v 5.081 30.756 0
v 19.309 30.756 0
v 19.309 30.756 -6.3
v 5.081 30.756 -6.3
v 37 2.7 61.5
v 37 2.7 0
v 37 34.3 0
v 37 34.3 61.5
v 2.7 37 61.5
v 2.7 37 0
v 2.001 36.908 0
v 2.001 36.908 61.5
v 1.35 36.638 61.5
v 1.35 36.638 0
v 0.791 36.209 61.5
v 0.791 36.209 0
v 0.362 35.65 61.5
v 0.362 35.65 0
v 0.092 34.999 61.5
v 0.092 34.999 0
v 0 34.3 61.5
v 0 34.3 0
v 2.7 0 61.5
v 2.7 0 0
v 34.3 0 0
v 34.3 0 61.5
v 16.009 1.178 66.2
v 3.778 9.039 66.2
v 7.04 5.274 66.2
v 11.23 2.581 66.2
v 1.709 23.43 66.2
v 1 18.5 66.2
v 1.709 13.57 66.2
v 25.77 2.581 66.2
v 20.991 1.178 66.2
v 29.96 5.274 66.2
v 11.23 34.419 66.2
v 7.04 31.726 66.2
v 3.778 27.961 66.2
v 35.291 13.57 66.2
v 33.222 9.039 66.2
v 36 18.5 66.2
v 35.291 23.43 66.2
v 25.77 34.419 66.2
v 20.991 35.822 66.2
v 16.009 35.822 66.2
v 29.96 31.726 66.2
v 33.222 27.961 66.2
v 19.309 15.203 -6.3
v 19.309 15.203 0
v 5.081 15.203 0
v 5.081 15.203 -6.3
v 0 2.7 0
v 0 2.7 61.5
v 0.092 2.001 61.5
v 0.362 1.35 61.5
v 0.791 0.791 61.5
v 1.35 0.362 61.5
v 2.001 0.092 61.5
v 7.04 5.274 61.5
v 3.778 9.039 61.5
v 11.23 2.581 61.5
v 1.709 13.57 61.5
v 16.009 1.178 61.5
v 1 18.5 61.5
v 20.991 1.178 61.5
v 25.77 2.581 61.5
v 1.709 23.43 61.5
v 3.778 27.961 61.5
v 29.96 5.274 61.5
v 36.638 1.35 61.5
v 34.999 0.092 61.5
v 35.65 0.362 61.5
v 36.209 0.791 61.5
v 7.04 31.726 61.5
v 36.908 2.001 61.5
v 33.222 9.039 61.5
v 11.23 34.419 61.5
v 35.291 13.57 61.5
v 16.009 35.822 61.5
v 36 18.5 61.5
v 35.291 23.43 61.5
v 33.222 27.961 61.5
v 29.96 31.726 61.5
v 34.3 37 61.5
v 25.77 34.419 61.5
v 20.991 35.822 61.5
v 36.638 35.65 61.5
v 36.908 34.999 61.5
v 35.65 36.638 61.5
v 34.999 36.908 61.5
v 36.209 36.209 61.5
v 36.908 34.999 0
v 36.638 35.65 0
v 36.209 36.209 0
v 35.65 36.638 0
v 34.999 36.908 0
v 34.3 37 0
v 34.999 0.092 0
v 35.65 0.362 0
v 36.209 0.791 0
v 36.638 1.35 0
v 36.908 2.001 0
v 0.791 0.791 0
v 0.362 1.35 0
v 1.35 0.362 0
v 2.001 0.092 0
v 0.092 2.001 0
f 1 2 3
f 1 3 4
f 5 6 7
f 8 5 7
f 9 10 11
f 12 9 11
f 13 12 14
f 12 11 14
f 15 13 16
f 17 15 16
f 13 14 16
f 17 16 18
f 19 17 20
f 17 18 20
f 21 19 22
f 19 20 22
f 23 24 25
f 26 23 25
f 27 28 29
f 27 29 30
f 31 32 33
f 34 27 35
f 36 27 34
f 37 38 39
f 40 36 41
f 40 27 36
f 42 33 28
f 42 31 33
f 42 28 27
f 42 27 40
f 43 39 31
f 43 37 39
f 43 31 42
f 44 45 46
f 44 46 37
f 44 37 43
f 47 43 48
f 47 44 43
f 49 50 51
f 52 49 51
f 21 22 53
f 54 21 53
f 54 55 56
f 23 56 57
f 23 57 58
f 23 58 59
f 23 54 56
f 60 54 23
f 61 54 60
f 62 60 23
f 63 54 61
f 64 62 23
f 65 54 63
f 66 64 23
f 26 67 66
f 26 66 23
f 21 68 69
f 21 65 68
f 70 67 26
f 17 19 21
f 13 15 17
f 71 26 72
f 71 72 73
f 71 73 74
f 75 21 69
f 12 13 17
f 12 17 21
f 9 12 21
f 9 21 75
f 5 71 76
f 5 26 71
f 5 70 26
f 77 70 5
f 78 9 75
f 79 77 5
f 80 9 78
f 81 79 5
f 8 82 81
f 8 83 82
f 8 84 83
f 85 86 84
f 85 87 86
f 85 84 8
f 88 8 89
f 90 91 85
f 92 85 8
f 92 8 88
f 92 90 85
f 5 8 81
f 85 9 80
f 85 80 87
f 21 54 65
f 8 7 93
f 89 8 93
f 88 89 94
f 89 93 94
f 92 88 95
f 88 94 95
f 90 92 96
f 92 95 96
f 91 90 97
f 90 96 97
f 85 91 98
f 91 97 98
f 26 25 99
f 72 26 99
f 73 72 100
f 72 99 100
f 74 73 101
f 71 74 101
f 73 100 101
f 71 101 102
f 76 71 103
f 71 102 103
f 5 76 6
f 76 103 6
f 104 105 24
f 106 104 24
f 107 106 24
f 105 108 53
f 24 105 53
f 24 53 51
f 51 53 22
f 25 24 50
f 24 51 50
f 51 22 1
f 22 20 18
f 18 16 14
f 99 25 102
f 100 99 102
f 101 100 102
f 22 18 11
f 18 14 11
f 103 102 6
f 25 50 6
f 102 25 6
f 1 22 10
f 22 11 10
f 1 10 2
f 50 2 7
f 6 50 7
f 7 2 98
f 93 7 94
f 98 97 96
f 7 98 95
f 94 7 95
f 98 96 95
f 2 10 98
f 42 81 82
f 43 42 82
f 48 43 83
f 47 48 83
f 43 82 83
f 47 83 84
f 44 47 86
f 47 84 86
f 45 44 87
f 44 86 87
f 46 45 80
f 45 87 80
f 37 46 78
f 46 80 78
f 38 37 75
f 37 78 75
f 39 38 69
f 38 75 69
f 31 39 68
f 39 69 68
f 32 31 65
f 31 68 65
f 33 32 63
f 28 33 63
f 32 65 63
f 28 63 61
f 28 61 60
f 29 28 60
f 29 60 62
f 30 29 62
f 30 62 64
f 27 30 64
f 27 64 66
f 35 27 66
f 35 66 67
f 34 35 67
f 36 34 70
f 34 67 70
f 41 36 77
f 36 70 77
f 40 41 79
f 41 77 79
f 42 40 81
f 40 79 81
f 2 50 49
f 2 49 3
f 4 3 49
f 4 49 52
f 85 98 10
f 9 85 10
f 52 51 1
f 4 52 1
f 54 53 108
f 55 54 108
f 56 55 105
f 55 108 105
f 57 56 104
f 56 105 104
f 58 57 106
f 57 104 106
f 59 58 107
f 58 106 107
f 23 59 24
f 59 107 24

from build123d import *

# Parameters (mm, degrees)
BOSS_EXTRUDE1_DEPTH = 61.5
SKETCH3_R           = 17.5
BOSS_EXTRUDE2_DEPTH = 4.7
SKETCH4_W           = 14.228114438
SKETCH4_H           = 15.553065114
BOSS_EXTRUDE3_DEPTH = 6.3


with BuildPart() as part:
    # Sketch1 → Boss-Extrude1 (new body)
    with BuildSketch(Plane.XY):
        with BuildLine():
            Line((2.7, 0), (34.3, 0))
            ThreePointArc((34.3, 0), (36.209188309, 0.790811691), (37, 2.7))
            Line((37, 2.7), (37, 34.3))
            ThreePointArc((37, 34.3), (36.209188309, 36.209188309), (34.3, 37))
            Line((34.3, 37), (2.7, 37))
            ThreePointArc((2.7, 37), (0.790811691, 36.209188309), (0, 34.3))
            Line((0, 34.3), (0, 2.7))
            ThreePointArc((0, 2.7), (0.790811691, 0.790811691), (2.7, 0))
        make_face()
    extrude(amount=BOSS_EXTRUDE1_DEPTH)

    # Sketch3 → Boss-Extrude2 (add)
    with BuildSketch(Plane.XY.offset(61.5)):
        with Locations((18.5, 18.5)):
            Circle(SKETCH3_R)
    extrude(amount=BOSS_EXTRUDE2_DEPTH)

    # Sketch4 → Boss-Extrude3 (add)
    with BuildSketch(Plane(origin=(0, 0, 0), x_dir=(-1, 0, 0), z_dir=(0, 0, -1))):
        with Locations((-12.194929465, 22.979733571)):
            Rectangle(SKETCH4_W, SKETCH4_H)
    extrude(amount=BOSS_EXTRUDE3_DEPTH)


solid = part.part
